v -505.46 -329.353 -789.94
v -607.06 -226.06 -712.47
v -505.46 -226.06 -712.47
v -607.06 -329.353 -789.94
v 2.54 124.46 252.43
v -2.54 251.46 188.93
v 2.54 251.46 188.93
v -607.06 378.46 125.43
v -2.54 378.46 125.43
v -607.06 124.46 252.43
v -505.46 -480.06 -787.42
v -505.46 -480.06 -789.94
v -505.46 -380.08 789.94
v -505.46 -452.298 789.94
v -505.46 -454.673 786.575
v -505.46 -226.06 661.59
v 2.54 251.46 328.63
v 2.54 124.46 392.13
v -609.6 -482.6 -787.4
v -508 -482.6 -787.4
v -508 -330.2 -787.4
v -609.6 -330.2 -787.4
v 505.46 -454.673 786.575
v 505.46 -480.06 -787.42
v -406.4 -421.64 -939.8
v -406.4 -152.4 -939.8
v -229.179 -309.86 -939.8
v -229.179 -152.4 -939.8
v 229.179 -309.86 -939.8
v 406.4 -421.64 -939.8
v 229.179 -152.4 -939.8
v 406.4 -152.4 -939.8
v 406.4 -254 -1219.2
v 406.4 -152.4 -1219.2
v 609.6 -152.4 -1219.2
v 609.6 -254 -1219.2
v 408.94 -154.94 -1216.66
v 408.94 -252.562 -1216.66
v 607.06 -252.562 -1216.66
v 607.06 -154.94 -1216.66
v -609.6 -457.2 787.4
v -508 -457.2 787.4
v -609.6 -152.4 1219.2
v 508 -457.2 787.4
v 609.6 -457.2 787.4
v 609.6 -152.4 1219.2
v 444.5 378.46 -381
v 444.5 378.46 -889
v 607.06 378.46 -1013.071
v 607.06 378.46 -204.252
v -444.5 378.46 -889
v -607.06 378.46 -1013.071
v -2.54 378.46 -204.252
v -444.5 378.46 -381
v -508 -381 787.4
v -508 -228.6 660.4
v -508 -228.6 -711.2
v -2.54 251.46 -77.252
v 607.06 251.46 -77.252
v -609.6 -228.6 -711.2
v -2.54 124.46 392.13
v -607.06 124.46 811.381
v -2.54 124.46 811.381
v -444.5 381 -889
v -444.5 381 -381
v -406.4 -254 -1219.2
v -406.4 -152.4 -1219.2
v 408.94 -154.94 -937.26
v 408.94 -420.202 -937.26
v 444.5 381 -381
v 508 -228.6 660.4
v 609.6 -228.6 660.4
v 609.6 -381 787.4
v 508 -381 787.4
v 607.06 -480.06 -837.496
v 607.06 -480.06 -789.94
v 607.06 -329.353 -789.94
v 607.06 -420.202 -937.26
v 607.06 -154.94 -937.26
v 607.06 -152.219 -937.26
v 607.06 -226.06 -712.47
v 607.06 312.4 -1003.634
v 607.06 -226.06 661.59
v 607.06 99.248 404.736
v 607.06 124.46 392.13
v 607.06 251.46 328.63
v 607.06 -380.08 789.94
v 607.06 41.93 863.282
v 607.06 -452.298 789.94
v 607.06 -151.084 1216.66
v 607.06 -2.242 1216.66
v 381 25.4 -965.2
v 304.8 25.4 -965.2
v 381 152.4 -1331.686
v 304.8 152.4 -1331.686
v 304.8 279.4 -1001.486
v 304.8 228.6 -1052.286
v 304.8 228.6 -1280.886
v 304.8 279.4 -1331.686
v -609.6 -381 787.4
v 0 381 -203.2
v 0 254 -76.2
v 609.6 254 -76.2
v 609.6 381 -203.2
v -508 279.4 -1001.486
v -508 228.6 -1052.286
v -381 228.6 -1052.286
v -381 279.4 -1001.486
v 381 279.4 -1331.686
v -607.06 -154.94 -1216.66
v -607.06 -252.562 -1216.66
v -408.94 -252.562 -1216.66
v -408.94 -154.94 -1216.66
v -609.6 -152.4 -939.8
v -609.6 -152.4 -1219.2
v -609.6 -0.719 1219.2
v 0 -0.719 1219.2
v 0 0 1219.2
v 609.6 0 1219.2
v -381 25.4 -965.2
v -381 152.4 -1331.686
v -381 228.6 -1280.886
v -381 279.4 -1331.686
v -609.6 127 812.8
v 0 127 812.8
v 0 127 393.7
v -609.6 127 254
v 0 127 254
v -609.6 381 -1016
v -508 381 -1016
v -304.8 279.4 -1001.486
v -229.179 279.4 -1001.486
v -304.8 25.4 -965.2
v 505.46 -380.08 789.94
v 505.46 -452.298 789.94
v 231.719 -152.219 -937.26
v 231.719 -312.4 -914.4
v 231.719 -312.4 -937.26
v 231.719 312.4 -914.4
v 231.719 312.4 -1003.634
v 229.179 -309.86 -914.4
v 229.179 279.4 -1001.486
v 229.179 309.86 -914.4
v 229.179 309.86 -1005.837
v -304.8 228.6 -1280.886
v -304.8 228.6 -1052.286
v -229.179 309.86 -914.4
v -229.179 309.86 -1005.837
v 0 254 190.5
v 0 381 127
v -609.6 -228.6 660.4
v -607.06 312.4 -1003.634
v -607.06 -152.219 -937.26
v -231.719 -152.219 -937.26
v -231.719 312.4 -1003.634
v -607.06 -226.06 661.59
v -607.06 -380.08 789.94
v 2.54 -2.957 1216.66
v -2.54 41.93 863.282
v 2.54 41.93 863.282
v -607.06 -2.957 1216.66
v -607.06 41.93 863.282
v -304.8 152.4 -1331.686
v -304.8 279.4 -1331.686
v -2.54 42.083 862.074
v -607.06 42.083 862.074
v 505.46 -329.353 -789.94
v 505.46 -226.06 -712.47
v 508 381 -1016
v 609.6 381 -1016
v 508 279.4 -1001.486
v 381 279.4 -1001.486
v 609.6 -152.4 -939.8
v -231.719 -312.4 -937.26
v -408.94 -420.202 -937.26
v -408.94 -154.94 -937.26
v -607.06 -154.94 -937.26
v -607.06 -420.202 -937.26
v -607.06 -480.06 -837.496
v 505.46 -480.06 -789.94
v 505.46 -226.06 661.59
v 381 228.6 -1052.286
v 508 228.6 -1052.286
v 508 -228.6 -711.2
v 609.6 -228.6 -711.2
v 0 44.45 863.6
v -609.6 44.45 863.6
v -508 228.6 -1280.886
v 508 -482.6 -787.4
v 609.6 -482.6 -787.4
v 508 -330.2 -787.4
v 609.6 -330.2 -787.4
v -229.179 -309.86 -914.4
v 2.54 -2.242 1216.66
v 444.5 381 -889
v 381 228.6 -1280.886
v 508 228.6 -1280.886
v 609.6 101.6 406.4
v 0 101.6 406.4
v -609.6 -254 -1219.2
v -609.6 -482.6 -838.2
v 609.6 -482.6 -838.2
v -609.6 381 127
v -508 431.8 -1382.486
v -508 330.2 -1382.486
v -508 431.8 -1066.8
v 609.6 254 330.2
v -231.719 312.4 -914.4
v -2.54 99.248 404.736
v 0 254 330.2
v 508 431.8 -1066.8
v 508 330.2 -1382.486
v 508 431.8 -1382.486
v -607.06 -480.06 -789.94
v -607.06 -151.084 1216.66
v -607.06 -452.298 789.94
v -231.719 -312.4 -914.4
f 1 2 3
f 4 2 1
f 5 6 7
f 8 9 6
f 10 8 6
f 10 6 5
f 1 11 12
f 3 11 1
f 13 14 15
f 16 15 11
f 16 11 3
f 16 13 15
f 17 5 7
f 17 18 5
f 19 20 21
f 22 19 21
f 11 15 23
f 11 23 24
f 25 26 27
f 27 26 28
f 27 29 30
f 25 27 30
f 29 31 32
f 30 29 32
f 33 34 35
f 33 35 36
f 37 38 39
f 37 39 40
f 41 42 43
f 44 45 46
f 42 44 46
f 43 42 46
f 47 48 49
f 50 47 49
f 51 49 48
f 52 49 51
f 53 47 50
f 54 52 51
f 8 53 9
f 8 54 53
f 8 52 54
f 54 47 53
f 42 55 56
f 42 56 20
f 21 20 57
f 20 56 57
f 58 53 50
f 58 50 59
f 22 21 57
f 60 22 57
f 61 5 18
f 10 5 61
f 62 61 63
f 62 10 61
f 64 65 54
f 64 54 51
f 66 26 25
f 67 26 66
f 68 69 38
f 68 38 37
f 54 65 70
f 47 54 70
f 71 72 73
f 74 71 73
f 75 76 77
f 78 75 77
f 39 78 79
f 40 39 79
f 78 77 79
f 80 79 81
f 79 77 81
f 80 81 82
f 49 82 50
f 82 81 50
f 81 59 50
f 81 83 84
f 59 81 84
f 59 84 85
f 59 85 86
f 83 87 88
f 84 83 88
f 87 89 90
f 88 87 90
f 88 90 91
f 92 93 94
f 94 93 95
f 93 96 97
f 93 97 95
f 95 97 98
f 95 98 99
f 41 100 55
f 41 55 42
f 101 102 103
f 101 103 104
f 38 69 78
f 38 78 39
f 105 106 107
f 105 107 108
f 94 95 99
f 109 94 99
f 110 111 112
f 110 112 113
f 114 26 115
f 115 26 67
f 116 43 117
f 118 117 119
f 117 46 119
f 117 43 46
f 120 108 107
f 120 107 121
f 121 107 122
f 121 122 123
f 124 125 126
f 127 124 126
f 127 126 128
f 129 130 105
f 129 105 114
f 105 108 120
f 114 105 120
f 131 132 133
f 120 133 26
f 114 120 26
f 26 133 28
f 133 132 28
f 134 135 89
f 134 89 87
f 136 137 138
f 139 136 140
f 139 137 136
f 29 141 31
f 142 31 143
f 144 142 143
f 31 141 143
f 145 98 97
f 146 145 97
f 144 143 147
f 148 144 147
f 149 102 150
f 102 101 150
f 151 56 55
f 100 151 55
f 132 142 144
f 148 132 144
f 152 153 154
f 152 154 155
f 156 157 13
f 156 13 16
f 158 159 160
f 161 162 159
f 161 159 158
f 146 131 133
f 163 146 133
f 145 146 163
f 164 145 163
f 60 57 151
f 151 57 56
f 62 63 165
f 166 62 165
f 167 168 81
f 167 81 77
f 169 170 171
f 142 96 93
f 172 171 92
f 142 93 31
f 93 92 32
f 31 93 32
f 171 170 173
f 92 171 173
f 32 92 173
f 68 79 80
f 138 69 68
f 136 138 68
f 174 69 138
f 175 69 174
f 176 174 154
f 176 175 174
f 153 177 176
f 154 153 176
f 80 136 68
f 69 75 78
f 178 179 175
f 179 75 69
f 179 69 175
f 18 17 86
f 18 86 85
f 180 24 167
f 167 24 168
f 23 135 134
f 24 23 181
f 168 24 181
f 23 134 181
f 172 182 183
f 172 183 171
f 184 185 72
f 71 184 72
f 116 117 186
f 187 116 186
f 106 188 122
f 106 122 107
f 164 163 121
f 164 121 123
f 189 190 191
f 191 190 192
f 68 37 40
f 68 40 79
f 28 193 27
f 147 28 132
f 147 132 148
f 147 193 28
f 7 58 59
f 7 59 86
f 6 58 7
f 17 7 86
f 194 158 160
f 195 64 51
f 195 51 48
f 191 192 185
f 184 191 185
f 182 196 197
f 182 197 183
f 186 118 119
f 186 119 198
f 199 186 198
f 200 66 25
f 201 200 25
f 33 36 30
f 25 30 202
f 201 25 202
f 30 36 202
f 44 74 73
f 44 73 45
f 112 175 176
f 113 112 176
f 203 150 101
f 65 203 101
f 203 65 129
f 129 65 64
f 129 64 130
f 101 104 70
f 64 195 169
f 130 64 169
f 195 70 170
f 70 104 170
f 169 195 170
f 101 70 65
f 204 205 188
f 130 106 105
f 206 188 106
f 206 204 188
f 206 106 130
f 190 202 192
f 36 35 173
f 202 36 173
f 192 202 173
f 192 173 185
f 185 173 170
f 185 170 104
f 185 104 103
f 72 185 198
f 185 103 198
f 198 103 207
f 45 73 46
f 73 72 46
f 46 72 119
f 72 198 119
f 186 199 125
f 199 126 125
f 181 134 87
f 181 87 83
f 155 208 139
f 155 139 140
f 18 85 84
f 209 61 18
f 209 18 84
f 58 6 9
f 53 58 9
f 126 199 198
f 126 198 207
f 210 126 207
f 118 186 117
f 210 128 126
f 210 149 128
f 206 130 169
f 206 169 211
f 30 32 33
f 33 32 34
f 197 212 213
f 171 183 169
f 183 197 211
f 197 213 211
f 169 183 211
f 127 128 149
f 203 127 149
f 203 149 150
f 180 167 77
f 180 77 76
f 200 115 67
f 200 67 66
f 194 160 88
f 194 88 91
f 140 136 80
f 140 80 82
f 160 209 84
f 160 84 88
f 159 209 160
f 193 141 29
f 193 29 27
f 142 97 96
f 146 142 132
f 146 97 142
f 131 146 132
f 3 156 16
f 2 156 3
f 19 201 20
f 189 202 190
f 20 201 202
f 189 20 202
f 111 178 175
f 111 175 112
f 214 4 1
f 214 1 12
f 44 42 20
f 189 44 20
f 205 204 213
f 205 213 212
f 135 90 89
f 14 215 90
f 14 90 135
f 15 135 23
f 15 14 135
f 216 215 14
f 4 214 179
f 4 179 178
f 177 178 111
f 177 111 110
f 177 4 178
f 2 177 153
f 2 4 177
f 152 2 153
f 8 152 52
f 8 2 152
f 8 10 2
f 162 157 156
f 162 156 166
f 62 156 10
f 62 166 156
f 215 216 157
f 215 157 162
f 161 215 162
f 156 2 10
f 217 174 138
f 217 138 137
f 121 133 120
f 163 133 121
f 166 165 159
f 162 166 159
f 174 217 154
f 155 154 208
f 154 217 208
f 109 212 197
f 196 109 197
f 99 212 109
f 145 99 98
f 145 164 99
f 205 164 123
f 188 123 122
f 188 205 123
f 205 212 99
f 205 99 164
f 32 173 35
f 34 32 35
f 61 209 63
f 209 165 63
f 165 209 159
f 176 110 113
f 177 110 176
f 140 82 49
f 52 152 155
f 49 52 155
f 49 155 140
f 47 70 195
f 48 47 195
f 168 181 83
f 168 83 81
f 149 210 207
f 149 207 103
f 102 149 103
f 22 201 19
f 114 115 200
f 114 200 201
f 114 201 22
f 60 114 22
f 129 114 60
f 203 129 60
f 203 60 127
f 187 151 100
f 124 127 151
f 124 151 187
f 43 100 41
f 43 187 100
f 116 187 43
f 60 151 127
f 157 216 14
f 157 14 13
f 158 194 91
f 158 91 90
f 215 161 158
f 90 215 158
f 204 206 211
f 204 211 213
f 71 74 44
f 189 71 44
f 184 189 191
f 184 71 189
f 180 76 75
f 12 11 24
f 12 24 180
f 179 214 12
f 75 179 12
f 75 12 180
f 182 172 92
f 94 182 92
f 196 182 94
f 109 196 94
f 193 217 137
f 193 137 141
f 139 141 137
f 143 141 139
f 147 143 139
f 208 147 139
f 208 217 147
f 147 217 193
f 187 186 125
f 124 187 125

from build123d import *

# Parameters (mm, degrees)
BOSS_EXTRUDE1_DEPTH      = 609.6
BOSS_EXTRUDE2_DEPTH      = 609.6
BOSS_EXTRUDE4_DEPTH      = 508
BOSS_EXTRUDE4_DEPTH_BACK = 508
SKETCH4_W                = 812.8
SKETCH4_H                = 558.8
CUT_EXTRUDE1_DEPTH       = 1464.754200677
CUT_EXTRUDE2_DEPTH       = 2295.732210956
CUT_EXTRUDE2_DEPTH_BACK  = 25.4
SKETCH5_W                = 458.358099056
SKETCH5_H                = 619.720514452
SHELL2_START             = -505.46
SHELL2_DEPTH             = 1010.92
SHELL2_START_2           = -607.06
SHELL2_2_DEPTH           = 1214.12
SHELL2_3_DEPTH           = 604.52
SHELL2_START_3           = 408.94
SHELL2_4_DEPTH           = 198.12
SHELL2_5_DEPTH           = 198.12
SHELL2_START_4           = 231.719049528
SHELL2_6_DEPTH           = 177.220950472
SHELL2_START_5           = -408.94
SHELL2_7_DEPTH           = 177.220950472
SHELL2_START_6           = 2.54
SHELL2_8_DEPTH           = 229.179049528
BOSS_EXTRUDE5_DEPTH      = 508
BOSS_EXTRUDE5_DEPTH_BACK = 508
BOSS_EXTRUDE6_DEPTH      = 76.2
CUT_EXTRUDE3_REACH       = 1742.311
SKETCH9_W                = 889
SKETCH9_H                = 508


# Read off the part's stored shape, not the designer's step: Shell2
with BuildPart() as part:
    # Left Side → Boss-Extrude1 (new body)
    with BuildSketch(Plane(origin=(0, 0, 0), x_dir=(0, 0, -1), z_dir=(1, 0, 0))):
        Polygon((-787.4, -381), (-787.4, -457.2), (-1219.2, -152.4), (-1219.2, 0), (-406.4, 101.6), (-330.2, 254), (76.2, 254), (203.2, 381), (1016, 381), (939.8, -152.4), (1219.2, -152.4), (1219.2, -254), (838.2, -482.6), (787.4, -482.6), (787.4, -330.2), (711.2, -228.6), (-660.4, -228.6), align=None)
    extrude(amount=BOSS_EXTRUDE1_DEPTH)

    # Sketch1 → Boss-Extrude2 (add)
    with BuildSketch(Plane(origin=(0, 0, 0), x_dir=(0, 0, -1), z_dir=(1, 0, 0))):
        Polygon((-787.4, -381), (-787.4, -457.2), (-1219.2, -152.4), (-1219.2, -0.718940146), (-863.6, 44.45), (-812.8, 127), (-254, 127), (-127, 381), (1016, 381), (939.8, -152.4), (1219.2, -152.4), (1219.2, -254), (838.2, -482.6), (787.4, -482.6), (787.4, -330.2), (711.2, -228.6), (-660.4, -228.6), align=None)
    extrude(amount=-BOSS_EXTRUDE2_DEPTH)

    # Sketch3 → Boss-Extrude4 (add, two sides: drawn at the far end of the back side and taken through both)
    with BuildSketch(Plane(origin=(0, 0, 0), x_dir=(0, 0, -1), z_dir=(1, 0, 0)).offset(-BOSS_EXTRUDE4_DEPTH_BACK)):
        Polygon((-787.4, -457.2), (787.4, -482.6), (787.4, -330.2), (711.2, -228.6), (-660.4, -228.6), (-787.4, -381), align=None)
    extrude(amount=BOSS_EXTRUDE4_DEPTH + BOSS_EXTRUDE4_DEPTH_BACK)

    # Sketch4 → Cut-Extrude1 (cut, through all)
    with BuildSketch(Plane(origin=(0, -152.4, 0), x_dir=(1, 0, 0), z_dir=(0, 1, 0))):
        with Locations((0, 1219.2)):
            Rectangle(SKETCH4_W, SKETCH4_H)
    extrude(amount=-CUT_EXTRUDE1_DEPTH, mode=Mode.SUBTRACT)

    # Sketch5 → Cut-Extrude2 (cut, two sides: drawn at the far end of the back side and taken through both)
    with BuildSketch(Plane(origin=(0, 0, -939.8), x_dir=(-1, 0, 0), z_dir=(0, 0, -1)).offset(-CUT_EXTRUDE2_DEPTH_BACK)):
        Rectangle(SKETCH5_W, SKETCH5_H)
    extrude(amount=CUT_EXTRUDE2_DEPTH + CUT_EXTRUDE2_DEPTH_BACK, mode=Mode.SUBTRACT)

    # Shell2 outline → Shell2 (cut)
    with BuildSketch(Plane.YZ.offset(SHELL2_START)):
        Polygon((312.400257226, -914.4), (312.400257226, -1003.634249283), (378.46, -1013.071355394), (378.46, -204.252102448), (251.46, -77.252102448), (251.46, 188.930193669), (124.46, 252.430193669), (124.46, 392.130193669), (99.248222887, 404.736082225), (41.929927698, 863.282443734), (-2.956713718, 1216.66), (-151.083883753, 1216.66), (-454.672968619, 786.575463107), (-480.06, -787.420482539), (-480.06, -837.496460729), (-420.201876437, -937.26), (-312.400257226, -937.26), (-312.400257226, -914.4), align=None)
    extrude(amount=SHELL2_DEPTH, mode=Mode.SUBTRACT)

    # Shell2 2 outline → Shell2 2 (cut)
    with BuildSketch(Plane.YZ.offset(SHELL2_START_2)):
        Polygon((312.400257226, -914.4), (312.400257226, -1003.634249283), (378.46, -1013.071355394), (378.46, -204.252102448), (251.46, -77.252102448), (251.46, 188.930193669), (124.46, 252.430193669), (124.46, 392.130193669), (99.248222887, 404.736082225), (41.929927698, 863.282443734), (-2.956713718, 1216.66), (-151.083883753, 1216.66), (-452.2980014, 789.94), (-380.080393165, 789.94), (-226.06, 661.589672363), (-226.06, -712.47), (-329.353333333, -789.94), (-480.06, -789.94), (-480.06, -837.496460729), (-420.201876437, -937.26), (-312.400257226, -937.26), (-312.400257226, -914.4), align=None)
    extrude(amount=SHELL2_2_DEPTH, mode=Mode.SUBTRACT)

    # Shell2 3 outline → Shell2 3 (cut)
    with BuildSketch(Plane.YZ.offset(SHELL2_START_2)):
        Polygon((378.46, 125.430193669), (251.46, 188.930193669), (251.46, -77.252102448), (378.46, -204.252102448), align=None)
        Polygon((99.248222887, 404.736082225), (124.46, 392.130193669), (124.46, 811.380660207), (42.083435134, 862.073930894), (41.929927698, 863.282443734), align=None)
    extrude(amount=SHELL2_3_DEPTH, mode=Mode.SUBTRACT)

    # Shell2 4 outline → Shell2 4 (cut)
    with BuildSketch(Plane.YZ.offset(SHELL2_START_3)):
        Polygon((-154.94, -937.26), (-152.219487758, -937.26), (312.400257226, -1003.634249283), (312.400257226, -914.4), (-312.400257226, -914.4), (-312.400257226, -937.26), (-420.201876437, -937.26), (-252.561876437, -1216.66), (-154.94, -1216.66), align=None)
        Polygon((124.46, 252.430193669), (251.46, 188.930193669), (251.46, 328.630193669), (124.46, 392.130193669), align=None)
        Polygon((-2.242266835, 1216.66), (-2.956713718, 1216.66), (41.929927698, 863.282443734), align=None)
    extrude(amount=SHELL2_4_DEPTH, mode=Mode.SUBTRACT)

    # Shell2 5 outline → Shell2 5 (cut)
    with BuildSketch(Plane.YZ.offset(SHELL2_START_2)):
        Polygon((-154.94, -937.26), (-152.219487758, -937.26), (312.400257226, -1003.634249283), (312.400257226, -914.4), (-312.400257226, -914.4), (-312.400257226, -937.26), (-420.201876437, -937.26), (-252.561876437, -1216.66), (-154.94, -1216.66), align=None)
    extrude(amount=SHELL2_5_DEPTH, mode=Mode.SUBTRACT)

    # Shell2 6 outline → Shell2 6 (cut)
    with BuildSketch(Plane.YZ.offset(SHELL2_START_4)):
        Polygon((-312.400257226, -937.26), (-152.219487758, -937.26), (312.400257226, -1003.634249283), (312.400257226, -914.4), (-312.400257226, -914.4), align=None)
        Polygon((124.46, 252.430193669), (251.46, 188.930193669), (251.46, 328.630193669), (124.46, 392.130193669), align=None)
        Polygon((-2.242266835, 1216.66), (-2.956713718, 1216.66), (41.929927698, 863.282443734), align=None)
    extrude(amount=SHELL2_6_DEPTH, mode=Mode.SUBTRACT)

    # Shell2 7 outline → Shell2 7 (cut)
    with BuildSketch(Plane.YZ.offset(SHELL2_START_5)):
        Polygon((-312.400257226, -937.26), (-152.219487758, -937.26), (312.400257226, -1003.634249283), (312.400257226, -914.4), (-312.400257226, -914.4), align=None)
    extrude(amount=SHELL2_7_DEPTH, mode=Mode.SUBTRACT)

    # Shell2 8 outline → Shell2 8 (cut)
    with BuildSketch(Plane.YZ.offset(SHELL2_START_6)):
        Polygon((124.46, 252.430193669), (251.46, 188.930193669), (251.46, 328.630193669), (124.46, 392.130193669), align=None)
        Polygon((-2.242266835, 1216.66), (-2.956713718, 1216.66), (41.929927698, 863.282443734), align=None)
    extrude(amount=SHELL2_8_DEPTH, mode=Mode.SUBTRACT)

    # Sketch7 → Boss-Extrude5 (add, two sides: drawn at the far end of the back side and taken through both)
    with BuildSketch(Plane(origin=(0, 0, 0), x_dir=(0, 0, -1), z_dir=(1, 0, 0)).offset(-BOSS_EXTRUDE5_DEPTH_BACK)):
        Polygon((1016, 381), (1066.8, 431.8), (1382.485714286, 431.8), (1382.485714286, 330.2), (1280.885714286, 228.6), (1052.285714286, 228.6), (1001.485714286, 279.4), align=None)
    extrude(amount=BOSS_EXTRUDE5_DEPTH + BOSS_EXTRUDE5_DEPTH_BACK)

    # Sketch8 → Boss-Extrude6 (add)
    with BuildSketch(Plane(origin=(304.8, 0, 0), x_dir=(0, 0, -1), z_dir=(1, 0, 0))):
        Polygon((1001.485714286, 279.4), (965.2, 25.4), (1331.685714286, 152.4), (1331.685714286, 279.4), align=None)
    boss_extrude6 = extrude(amount=BOSS_EXTRUDE6_DEPTH)

    # Mirror1: Boss-Extrude6 across plane
    add(boss_extrude6.mirror(Plane(origin=(0, 0, 0), x_dir=(0, 0, 1), z_dir=(1, 0, 0))))

    # Sketch9 → Cut-Extrude3 (cut, up to next)
    with BuildSketch(Plane(origin=(0, 381, 0), x_dir=(1, 0, 0), z_dir=(0, 1, 0)), mode=Mode.PRIVATE) as cut_extrude3_sk1:
        with Locations((0, 635)):
            Rectangle(SKETCH9_W, SKETCH9_H)
    cut_extrude3_tool1 = extrude(cut_extrude3_sk1.sketch, amount=-CUT_EXTRUDE3_REACH, mode=Mode.PRIVATE) & part.part
    add(cut_extrude3_tool1.solids().sort_by_distance((0, 381, -635))[0], mode=Mode.SUBTRACT)


solid = part.part
